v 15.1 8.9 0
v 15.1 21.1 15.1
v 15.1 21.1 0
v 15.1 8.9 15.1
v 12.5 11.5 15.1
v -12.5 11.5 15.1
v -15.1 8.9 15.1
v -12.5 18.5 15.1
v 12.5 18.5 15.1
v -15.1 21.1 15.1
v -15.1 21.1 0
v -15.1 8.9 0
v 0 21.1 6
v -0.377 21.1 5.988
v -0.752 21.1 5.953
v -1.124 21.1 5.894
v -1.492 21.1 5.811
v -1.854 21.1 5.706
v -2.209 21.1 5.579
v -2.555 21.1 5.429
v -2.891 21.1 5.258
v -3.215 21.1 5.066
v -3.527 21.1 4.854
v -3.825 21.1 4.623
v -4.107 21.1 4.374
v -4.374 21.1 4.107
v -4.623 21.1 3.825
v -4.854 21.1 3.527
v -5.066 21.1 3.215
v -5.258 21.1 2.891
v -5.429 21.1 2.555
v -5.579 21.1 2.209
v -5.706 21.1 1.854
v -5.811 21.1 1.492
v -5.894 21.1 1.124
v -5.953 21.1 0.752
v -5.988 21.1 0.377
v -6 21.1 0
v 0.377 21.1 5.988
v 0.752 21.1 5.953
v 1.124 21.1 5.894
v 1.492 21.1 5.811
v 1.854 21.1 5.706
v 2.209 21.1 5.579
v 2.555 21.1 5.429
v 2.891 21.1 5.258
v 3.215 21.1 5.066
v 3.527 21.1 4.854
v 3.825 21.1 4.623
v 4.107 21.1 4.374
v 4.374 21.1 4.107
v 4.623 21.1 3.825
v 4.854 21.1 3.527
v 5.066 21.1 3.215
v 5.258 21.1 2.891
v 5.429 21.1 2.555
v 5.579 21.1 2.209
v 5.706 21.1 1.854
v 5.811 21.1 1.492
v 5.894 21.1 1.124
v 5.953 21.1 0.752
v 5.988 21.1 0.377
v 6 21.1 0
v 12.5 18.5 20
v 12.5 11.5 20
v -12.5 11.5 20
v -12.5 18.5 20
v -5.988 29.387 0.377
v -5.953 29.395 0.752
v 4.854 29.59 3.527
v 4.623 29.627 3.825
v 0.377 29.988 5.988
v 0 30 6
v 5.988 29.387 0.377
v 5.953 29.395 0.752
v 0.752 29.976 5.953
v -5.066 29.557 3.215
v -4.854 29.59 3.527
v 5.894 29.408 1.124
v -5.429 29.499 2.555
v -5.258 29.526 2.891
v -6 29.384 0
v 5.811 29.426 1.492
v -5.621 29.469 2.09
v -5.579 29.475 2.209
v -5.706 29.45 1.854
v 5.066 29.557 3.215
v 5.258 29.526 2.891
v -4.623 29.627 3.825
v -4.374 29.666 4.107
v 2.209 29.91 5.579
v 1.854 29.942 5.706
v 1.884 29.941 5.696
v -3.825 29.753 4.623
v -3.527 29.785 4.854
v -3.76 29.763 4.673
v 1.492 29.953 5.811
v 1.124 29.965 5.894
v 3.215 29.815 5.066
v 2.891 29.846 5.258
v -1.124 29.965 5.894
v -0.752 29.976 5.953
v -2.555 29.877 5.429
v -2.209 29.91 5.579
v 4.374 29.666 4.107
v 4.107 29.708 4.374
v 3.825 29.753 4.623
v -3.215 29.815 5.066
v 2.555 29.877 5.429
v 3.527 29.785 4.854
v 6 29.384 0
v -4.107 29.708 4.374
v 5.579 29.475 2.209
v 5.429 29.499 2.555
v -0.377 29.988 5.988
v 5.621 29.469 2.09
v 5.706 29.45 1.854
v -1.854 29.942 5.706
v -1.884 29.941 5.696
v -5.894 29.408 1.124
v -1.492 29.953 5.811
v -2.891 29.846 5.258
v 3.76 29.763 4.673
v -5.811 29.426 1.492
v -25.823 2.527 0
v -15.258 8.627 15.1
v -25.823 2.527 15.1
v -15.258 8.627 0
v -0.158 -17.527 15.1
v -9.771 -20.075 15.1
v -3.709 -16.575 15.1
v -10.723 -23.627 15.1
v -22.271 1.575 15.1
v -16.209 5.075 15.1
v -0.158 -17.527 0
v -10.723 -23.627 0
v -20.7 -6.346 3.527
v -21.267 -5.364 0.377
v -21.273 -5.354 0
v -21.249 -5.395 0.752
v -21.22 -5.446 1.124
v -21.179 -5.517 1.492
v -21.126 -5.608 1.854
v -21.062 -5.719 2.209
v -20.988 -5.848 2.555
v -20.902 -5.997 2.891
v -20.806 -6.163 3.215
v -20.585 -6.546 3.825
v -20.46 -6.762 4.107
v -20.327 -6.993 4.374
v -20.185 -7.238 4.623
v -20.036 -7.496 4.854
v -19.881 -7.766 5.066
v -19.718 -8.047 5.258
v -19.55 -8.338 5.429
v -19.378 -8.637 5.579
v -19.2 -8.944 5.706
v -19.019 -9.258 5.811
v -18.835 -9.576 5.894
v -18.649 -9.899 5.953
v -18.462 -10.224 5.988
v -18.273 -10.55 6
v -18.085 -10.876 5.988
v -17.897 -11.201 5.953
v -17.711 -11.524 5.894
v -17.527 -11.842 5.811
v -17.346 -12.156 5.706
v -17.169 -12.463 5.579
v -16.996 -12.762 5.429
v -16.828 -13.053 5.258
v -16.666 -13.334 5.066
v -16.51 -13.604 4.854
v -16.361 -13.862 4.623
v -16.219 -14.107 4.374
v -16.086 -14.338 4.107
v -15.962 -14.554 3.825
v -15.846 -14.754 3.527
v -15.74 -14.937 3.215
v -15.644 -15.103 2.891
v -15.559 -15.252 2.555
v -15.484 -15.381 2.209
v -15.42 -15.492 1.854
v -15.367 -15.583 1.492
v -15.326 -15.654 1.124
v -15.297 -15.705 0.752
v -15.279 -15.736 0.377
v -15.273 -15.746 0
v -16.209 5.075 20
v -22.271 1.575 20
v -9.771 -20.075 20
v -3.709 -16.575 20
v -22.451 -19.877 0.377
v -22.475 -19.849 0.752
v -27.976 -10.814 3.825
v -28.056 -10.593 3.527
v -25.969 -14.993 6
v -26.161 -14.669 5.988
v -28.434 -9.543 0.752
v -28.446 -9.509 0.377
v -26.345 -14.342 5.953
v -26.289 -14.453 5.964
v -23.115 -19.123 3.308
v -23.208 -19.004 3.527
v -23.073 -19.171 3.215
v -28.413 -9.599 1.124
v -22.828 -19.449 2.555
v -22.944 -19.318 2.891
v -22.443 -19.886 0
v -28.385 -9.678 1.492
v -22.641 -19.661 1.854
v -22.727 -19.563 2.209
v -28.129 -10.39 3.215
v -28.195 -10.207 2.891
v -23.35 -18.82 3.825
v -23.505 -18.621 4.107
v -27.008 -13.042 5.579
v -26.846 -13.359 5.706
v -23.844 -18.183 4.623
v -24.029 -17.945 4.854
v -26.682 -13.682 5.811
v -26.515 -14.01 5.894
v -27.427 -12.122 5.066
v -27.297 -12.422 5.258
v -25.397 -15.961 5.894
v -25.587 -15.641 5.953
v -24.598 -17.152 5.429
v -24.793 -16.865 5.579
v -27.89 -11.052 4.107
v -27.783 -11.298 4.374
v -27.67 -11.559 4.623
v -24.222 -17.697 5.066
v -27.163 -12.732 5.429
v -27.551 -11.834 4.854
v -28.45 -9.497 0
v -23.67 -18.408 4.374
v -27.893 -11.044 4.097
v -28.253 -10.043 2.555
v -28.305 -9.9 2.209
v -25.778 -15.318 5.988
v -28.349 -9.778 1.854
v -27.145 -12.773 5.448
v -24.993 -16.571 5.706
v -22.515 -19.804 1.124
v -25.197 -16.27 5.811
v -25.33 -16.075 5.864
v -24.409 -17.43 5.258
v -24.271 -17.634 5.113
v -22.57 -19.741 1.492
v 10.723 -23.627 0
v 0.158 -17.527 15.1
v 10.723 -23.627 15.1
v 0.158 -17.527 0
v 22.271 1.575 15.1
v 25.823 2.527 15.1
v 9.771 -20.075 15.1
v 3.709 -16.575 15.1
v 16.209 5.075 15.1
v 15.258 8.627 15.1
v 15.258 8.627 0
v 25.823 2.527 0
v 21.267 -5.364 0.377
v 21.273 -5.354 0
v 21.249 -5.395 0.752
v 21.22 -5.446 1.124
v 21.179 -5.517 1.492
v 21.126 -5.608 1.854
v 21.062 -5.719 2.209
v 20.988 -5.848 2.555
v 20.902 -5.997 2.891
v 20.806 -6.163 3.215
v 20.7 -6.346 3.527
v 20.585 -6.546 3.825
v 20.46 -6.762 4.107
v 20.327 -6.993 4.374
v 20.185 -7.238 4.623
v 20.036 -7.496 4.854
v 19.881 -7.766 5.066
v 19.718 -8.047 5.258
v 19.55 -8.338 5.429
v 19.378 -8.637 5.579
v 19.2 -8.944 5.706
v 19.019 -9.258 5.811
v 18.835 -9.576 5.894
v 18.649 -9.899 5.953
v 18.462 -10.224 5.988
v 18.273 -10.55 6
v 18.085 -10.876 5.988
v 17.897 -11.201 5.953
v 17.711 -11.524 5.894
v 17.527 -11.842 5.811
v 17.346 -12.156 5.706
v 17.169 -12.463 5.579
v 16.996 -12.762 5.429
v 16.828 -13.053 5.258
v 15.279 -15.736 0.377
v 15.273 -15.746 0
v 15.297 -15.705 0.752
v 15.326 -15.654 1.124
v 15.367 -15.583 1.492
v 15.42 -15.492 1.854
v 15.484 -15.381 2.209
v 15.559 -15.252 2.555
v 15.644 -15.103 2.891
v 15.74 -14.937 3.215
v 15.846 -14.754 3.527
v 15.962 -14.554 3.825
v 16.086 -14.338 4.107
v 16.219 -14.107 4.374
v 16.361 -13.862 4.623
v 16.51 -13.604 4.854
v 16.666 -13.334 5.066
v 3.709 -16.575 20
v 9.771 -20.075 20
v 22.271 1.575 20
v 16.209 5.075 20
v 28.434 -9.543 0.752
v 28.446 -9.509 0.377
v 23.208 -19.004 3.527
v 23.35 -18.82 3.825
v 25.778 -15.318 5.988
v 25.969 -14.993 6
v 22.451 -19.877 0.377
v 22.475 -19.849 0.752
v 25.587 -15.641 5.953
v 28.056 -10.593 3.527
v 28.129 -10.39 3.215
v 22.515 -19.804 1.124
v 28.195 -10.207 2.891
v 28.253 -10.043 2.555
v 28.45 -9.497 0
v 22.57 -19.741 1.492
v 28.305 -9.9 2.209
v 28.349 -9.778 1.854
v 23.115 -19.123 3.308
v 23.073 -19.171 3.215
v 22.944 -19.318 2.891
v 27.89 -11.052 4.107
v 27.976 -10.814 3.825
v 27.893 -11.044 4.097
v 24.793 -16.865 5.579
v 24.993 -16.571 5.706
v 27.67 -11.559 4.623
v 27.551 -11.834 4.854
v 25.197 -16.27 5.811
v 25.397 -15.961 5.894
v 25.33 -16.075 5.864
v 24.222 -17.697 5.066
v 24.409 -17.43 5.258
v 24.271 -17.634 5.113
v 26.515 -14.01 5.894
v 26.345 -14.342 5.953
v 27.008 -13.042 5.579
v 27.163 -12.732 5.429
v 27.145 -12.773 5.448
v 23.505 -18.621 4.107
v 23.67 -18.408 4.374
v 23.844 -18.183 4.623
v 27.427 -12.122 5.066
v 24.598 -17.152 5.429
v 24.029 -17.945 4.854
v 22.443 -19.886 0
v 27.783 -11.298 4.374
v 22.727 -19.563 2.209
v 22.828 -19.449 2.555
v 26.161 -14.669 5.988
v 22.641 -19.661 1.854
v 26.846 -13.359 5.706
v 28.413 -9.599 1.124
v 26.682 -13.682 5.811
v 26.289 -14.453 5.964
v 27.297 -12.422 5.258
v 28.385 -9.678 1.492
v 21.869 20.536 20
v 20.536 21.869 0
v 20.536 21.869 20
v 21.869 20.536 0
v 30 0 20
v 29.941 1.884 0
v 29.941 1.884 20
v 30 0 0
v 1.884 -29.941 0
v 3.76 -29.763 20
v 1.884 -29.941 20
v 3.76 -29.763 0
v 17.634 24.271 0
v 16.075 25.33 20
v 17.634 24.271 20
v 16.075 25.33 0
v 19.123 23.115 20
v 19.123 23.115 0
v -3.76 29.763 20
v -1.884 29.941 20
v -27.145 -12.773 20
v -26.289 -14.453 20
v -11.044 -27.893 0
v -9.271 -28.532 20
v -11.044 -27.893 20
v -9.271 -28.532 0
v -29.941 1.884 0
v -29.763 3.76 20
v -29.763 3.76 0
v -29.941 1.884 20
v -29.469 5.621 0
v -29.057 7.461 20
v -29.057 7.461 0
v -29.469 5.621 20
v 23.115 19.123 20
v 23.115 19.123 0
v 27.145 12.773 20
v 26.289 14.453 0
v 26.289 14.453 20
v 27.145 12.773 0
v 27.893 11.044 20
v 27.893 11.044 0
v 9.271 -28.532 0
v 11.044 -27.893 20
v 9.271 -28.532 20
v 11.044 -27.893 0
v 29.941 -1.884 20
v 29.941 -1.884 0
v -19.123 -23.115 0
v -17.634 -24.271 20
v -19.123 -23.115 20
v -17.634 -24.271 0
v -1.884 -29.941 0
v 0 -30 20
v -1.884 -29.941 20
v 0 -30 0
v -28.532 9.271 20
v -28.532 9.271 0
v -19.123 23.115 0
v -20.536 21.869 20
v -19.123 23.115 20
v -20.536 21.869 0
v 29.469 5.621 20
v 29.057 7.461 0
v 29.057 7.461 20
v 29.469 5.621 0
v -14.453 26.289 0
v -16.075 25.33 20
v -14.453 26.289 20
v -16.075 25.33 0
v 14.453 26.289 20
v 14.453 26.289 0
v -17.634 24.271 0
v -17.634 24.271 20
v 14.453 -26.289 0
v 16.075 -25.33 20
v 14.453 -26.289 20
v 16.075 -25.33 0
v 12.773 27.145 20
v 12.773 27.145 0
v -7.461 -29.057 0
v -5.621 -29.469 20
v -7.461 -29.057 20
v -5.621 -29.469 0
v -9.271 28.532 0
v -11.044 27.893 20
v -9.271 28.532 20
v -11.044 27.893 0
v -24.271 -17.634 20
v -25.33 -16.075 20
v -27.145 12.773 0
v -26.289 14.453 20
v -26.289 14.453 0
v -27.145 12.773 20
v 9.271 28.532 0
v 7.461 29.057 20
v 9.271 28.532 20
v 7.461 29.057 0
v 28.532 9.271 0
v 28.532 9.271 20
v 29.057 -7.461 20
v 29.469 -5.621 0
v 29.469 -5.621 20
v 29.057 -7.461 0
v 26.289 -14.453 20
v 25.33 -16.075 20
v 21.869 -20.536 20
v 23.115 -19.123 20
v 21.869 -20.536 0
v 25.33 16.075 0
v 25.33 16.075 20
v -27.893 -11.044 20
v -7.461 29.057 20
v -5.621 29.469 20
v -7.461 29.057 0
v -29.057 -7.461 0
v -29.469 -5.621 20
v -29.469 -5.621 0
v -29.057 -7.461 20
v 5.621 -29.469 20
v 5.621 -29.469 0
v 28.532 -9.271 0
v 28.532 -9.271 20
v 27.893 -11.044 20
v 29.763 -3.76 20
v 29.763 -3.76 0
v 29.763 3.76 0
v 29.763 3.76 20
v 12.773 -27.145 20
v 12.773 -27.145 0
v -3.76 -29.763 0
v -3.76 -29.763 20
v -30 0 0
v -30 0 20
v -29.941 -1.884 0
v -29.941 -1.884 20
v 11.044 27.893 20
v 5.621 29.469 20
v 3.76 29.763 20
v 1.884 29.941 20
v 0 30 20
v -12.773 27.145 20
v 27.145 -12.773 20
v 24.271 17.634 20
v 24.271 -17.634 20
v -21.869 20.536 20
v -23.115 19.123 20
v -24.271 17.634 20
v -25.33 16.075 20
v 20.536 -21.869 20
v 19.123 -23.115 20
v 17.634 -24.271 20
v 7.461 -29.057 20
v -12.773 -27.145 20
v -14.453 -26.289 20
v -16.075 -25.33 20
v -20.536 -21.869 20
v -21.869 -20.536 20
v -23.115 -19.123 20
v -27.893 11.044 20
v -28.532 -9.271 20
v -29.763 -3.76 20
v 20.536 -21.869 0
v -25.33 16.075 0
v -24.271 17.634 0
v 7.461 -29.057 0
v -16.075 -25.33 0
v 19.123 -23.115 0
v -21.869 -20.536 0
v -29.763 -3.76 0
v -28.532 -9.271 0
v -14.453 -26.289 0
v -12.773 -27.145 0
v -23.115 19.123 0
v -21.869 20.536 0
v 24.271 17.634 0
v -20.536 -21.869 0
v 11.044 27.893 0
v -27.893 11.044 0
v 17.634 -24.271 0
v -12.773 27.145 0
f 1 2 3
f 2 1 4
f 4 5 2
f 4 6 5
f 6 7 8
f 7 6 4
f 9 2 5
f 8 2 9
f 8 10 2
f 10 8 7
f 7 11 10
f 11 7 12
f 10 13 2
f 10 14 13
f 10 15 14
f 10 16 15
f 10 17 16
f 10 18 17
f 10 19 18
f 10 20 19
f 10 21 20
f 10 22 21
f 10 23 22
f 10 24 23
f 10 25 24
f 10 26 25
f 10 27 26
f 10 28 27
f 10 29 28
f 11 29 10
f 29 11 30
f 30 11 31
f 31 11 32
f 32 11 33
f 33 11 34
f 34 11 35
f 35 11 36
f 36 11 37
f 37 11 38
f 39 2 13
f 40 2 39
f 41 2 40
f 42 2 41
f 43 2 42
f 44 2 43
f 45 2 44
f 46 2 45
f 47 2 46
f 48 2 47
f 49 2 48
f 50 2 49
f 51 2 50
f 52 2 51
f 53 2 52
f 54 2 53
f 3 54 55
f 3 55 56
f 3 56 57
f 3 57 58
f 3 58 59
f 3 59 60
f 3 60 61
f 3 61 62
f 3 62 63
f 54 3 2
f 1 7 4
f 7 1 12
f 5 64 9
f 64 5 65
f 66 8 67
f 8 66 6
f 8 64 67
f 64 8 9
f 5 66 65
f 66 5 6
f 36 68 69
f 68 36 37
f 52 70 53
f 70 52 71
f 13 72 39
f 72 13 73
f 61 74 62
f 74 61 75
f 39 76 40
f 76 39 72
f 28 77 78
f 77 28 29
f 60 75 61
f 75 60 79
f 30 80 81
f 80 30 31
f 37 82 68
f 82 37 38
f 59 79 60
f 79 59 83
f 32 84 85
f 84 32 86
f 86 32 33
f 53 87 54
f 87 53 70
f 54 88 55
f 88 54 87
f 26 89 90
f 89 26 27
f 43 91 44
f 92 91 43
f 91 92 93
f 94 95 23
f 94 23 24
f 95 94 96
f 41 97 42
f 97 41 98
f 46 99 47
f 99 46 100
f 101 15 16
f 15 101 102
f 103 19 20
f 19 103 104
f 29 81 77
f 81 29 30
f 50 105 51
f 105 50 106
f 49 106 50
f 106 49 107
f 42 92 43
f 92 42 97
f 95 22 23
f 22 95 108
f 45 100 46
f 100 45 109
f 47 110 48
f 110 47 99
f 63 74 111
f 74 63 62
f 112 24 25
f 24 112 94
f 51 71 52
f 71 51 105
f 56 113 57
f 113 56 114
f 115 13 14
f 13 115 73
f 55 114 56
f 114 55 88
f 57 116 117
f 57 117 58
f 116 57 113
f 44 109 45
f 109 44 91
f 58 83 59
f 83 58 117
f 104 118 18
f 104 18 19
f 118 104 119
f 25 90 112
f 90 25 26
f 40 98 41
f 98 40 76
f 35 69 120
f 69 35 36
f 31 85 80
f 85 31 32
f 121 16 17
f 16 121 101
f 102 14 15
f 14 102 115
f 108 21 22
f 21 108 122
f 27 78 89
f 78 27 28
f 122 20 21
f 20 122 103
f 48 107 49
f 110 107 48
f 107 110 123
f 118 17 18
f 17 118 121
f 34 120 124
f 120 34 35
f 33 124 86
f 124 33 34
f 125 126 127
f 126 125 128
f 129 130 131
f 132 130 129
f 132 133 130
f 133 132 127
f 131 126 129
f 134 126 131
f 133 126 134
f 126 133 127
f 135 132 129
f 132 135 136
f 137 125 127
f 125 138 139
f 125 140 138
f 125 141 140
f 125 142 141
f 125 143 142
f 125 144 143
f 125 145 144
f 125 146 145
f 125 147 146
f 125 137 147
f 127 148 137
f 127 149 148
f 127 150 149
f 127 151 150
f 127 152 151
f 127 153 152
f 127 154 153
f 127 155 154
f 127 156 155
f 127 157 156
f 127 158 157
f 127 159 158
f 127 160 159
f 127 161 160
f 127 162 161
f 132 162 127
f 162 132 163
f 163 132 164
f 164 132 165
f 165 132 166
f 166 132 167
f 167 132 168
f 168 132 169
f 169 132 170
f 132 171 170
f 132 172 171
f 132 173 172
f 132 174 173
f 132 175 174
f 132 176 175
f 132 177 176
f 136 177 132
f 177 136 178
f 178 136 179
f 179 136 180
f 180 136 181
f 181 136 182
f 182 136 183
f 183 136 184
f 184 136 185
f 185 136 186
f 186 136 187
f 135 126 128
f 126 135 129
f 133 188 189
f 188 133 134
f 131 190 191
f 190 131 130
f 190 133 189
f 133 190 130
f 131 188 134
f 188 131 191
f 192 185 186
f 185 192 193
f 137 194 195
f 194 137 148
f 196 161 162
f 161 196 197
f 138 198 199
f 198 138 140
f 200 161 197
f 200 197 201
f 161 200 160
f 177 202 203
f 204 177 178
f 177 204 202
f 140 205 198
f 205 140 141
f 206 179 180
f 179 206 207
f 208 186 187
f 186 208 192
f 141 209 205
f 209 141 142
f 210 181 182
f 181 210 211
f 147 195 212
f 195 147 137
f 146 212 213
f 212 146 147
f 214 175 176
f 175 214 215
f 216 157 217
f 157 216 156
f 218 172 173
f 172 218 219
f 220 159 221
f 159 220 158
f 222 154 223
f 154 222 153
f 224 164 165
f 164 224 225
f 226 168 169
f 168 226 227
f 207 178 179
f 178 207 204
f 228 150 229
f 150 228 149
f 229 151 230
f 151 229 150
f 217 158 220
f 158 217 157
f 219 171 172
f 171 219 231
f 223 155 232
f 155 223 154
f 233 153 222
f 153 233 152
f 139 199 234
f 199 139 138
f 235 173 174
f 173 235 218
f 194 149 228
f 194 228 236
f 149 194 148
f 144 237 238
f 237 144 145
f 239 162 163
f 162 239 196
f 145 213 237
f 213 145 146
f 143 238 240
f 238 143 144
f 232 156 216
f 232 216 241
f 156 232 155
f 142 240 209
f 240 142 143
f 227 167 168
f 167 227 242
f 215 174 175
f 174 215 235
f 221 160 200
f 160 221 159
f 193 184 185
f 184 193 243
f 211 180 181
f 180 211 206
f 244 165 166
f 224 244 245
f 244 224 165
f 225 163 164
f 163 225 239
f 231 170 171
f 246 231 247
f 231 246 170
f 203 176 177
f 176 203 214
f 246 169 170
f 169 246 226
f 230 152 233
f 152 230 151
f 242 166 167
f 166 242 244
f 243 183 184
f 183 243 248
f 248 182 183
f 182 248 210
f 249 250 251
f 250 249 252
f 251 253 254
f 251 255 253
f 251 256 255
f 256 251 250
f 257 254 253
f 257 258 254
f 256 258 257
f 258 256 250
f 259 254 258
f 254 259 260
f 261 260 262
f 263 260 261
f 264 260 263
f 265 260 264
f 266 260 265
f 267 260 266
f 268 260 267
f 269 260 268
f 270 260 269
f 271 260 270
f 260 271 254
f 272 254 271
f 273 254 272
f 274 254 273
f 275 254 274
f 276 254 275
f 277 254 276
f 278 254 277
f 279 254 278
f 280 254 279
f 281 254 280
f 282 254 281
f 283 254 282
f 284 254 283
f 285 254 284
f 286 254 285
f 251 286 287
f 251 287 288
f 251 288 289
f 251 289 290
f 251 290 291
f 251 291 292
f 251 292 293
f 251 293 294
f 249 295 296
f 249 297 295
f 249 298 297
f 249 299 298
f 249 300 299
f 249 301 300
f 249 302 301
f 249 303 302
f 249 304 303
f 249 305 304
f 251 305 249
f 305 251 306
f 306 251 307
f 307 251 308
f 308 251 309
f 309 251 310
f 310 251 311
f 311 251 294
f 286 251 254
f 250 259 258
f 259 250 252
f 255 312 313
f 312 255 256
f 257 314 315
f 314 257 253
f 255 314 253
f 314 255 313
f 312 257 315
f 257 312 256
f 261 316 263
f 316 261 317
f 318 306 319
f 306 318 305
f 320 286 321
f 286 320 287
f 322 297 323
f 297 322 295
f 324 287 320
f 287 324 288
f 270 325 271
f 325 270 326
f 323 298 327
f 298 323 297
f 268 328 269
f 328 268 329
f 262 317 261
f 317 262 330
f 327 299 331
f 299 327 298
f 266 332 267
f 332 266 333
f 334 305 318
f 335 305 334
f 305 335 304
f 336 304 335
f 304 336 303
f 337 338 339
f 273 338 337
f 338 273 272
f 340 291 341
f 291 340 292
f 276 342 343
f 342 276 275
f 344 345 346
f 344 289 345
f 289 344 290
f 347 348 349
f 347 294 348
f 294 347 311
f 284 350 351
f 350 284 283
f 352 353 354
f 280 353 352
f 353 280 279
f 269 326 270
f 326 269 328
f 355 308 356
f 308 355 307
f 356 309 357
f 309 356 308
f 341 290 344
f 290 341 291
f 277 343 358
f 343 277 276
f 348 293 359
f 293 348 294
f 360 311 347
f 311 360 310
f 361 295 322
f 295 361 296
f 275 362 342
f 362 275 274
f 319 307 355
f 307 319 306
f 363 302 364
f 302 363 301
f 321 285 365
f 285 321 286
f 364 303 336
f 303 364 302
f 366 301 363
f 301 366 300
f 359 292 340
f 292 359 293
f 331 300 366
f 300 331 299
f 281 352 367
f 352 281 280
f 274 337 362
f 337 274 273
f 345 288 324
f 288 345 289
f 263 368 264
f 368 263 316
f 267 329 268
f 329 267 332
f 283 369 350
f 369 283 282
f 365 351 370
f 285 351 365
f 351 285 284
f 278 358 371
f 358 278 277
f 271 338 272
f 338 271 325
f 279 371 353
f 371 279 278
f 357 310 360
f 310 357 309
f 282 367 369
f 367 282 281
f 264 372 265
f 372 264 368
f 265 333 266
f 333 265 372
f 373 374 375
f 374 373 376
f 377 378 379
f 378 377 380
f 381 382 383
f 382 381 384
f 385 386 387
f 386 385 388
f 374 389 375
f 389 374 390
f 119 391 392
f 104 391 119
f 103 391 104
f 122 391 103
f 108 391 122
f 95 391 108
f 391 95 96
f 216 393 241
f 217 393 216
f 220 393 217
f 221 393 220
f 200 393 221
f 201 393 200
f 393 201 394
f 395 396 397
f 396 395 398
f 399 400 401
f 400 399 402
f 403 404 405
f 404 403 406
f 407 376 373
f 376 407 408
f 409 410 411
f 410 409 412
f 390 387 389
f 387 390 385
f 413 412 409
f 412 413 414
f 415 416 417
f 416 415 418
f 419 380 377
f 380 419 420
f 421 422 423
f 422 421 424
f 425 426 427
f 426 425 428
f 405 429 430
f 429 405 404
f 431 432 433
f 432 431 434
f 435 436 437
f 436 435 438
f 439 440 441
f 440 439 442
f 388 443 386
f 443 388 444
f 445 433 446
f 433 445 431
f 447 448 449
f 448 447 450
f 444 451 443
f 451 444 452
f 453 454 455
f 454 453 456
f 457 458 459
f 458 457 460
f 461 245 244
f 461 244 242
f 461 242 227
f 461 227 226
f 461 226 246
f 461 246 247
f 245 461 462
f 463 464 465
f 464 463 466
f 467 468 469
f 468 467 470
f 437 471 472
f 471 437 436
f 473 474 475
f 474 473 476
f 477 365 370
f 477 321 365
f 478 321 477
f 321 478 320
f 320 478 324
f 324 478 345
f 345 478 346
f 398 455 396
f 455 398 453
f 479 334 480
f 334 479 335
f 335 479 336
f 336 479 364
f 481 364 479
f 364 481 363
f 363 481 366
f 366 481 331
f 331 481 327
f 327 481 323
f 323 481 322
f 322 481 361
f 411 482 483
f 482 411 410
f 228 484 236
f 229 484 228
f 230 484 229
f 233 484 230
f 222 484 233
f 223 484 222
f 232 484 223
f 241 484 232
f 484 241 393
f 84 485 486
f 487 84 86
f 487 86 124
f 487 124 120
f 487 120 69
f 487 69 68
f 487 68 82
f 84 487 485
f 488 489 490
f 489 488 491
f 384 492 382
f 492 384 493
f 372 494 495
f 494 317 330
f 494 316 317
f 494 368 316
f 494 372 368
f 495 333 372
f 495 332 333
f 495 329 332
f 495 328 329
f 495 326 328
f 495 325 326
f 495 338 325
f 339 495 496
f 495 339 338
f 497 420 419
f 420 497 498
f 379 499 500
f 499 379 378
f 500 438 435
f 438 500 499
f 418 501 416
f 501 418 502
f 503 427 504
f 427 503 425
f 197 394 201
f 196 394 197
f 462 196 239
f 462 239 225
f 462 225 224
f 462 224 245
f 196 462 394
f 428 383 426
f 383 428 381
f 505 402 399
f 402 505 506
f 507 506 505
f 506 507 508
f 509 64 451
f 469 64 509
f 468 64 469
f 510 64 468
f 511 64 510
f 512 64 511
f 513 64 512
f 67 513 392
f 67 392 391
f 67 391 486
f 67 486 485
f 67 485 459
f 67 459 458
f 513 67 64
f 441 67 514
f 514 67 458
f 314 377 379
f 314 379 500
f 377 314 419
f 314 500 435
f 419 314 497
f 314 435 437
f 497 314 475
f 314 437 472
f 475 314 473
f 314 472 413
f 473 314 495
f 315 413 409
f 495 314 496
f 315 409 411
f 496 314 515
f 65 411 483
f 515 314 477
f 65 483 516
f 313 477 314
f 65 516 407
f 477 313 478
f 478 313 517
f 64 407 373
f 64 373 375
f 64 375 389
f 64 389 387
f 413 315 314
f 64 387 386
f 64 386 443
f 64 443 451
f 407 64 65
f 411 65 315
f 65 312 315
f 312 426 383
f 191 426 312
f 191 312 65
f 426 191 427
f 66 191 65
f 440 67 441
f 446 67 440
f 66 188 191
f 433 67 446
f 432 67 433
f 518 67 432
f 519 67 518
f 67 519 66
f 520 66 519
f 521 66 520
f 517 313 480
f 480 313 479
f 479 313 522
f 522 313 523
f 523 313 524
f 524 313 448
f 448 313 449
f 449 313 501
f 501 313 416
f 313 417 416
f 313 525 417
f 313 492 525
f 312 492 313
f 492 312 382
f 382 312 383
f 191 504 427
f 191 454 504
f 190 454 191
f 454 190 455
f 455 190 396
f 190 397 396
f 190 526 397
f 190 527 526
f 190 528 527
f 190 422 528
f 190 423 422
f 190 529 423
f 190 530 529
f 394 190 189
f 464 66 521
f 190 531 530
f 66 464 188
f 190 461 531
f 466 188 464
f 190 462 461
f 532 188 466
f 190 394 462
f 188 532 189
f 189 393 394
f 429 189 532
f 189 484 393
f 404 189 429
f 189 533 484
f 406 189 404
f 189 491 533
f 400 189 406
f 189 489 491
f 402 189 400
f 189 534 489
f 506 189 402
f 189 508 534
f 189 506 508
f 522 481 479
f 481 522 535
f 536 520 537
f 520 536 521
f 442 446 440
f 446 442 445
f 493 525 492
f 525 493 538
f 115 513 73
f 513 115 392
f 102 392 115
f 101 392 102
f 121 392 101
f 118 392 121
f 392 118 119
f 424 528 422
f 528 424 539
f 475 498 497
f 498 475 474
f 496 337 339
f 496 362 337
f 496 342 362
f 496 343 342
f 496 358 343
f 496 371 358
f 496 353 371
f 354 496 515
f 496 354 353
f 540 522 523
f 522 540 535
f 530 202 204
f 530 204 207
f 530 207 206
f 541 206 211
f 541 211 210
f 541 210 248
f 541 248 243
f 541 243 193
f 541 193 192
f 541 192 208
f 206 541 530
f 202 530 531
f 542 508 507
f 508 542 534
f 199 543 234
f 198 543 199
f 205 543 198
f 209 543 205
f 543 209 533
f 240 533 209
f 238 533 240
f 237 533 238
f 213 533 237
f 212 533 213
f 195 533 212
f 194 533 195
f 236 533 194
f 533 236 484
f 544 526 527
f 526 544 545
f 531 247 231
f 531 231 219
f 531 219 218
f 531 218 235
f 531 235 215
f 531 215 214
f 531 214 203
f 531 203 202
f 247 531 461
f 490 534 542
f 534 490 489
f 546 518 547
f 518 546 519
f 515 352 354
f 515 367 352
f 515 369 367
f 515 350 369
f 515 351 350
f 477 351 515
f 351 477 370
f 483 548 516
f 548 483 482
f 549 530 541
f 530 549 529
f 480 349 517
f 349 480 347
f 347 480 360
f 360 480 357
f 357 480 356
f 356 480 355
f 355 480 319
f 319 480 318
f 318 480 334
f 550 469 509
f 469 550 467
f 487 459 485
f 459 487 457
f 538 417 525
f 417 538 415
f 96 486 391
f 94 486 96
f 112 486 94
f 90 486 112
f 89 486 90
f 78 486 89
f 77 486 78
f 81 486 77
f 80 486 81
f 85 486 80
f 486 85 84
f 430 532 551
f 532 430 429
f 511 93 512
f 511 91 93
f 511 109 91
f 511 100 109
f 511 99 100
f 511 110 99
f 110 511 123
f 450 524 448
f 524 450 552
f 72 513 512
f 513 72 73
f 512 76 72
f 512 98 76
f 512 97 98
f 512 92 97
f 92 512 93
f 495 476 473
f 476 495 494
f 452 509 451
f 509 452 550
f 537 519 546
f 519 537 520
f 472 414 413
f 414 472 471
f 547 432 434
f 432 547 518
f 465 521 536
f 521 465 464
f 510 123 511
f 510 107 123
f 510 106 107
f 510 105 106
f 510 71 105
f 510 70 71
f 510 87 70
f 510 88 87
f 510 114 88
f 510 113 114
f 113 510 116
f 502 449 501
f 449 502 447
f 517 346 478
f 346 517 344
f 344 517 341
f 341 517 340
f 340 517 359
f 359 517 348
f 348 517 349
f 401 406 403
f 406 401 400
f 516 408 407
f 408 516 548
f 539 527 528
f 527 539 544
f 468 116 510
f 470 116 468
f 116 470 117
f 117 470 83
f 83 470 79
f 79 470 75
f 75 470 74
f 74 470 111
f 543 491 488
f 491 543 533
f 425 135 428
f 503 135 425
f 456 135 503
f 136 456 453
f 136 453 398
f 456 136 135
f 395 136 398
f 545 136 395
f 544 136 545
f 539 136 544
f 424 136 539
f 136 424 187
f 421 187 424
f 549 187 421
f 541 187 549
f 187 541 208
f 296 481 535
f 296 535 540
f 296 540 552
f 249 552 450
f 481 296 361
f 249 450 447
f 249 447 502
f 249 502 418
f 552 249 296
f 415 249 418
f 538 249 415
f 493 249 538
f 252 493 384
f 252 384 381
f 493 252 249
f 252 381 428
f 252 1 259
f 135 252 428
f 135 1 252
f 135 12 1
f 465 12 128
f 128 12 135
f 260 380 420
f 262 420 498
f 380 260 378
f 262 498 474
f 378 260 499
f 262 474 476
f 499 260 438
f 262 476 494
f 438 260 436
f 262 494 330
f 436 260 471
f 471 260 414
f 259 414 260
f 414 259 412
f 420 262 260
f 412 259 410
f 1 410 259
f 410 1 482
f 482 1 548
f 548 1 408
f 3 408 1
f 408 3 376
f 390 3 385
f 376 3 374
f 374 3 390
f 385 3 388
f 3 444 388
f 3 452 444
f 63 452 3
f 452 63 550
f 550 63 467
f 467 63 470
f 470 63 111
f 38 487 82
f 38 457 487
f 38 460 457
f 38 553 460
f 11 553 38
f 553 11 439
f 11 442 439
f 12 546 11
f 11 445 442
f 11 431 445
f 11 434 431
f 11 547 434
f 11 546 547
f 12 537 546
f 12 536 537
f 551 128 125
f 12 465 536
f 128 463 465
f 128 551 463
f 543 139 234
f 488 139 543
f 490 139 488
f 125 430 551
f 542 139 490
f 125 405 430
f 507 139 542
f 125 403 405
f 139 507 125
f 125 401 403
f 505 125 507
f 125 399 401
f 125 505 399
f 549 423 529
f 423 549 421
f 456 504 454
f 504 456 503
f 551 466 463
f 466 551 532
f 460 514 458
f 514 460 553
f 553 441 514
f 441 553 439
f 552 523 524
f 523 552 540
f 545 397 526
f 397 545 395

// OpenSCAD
$fn=100;
cam_mod_size = 30;
cam_mod_thick = 12;
module camera_holder() {
    difference(){
        cylinder(r=30, h=30/2+5);
        for(i=[0:2])
        rotate(120*i)
        translate([0,15])
        {
            cube([cam_mod_size+0.2, cam_mod_thick+0.2, cam_mod_size+0.2],center=true);
            cube([cam_mod_size-5, cam_mod_thick-5, 100],center=true);
            rotate([-90,0,0])
            cylinder(r=12/2,h=20);
        }
    }
}
if(0){
    camera_holder();
}else{
    camera_holder();
}
